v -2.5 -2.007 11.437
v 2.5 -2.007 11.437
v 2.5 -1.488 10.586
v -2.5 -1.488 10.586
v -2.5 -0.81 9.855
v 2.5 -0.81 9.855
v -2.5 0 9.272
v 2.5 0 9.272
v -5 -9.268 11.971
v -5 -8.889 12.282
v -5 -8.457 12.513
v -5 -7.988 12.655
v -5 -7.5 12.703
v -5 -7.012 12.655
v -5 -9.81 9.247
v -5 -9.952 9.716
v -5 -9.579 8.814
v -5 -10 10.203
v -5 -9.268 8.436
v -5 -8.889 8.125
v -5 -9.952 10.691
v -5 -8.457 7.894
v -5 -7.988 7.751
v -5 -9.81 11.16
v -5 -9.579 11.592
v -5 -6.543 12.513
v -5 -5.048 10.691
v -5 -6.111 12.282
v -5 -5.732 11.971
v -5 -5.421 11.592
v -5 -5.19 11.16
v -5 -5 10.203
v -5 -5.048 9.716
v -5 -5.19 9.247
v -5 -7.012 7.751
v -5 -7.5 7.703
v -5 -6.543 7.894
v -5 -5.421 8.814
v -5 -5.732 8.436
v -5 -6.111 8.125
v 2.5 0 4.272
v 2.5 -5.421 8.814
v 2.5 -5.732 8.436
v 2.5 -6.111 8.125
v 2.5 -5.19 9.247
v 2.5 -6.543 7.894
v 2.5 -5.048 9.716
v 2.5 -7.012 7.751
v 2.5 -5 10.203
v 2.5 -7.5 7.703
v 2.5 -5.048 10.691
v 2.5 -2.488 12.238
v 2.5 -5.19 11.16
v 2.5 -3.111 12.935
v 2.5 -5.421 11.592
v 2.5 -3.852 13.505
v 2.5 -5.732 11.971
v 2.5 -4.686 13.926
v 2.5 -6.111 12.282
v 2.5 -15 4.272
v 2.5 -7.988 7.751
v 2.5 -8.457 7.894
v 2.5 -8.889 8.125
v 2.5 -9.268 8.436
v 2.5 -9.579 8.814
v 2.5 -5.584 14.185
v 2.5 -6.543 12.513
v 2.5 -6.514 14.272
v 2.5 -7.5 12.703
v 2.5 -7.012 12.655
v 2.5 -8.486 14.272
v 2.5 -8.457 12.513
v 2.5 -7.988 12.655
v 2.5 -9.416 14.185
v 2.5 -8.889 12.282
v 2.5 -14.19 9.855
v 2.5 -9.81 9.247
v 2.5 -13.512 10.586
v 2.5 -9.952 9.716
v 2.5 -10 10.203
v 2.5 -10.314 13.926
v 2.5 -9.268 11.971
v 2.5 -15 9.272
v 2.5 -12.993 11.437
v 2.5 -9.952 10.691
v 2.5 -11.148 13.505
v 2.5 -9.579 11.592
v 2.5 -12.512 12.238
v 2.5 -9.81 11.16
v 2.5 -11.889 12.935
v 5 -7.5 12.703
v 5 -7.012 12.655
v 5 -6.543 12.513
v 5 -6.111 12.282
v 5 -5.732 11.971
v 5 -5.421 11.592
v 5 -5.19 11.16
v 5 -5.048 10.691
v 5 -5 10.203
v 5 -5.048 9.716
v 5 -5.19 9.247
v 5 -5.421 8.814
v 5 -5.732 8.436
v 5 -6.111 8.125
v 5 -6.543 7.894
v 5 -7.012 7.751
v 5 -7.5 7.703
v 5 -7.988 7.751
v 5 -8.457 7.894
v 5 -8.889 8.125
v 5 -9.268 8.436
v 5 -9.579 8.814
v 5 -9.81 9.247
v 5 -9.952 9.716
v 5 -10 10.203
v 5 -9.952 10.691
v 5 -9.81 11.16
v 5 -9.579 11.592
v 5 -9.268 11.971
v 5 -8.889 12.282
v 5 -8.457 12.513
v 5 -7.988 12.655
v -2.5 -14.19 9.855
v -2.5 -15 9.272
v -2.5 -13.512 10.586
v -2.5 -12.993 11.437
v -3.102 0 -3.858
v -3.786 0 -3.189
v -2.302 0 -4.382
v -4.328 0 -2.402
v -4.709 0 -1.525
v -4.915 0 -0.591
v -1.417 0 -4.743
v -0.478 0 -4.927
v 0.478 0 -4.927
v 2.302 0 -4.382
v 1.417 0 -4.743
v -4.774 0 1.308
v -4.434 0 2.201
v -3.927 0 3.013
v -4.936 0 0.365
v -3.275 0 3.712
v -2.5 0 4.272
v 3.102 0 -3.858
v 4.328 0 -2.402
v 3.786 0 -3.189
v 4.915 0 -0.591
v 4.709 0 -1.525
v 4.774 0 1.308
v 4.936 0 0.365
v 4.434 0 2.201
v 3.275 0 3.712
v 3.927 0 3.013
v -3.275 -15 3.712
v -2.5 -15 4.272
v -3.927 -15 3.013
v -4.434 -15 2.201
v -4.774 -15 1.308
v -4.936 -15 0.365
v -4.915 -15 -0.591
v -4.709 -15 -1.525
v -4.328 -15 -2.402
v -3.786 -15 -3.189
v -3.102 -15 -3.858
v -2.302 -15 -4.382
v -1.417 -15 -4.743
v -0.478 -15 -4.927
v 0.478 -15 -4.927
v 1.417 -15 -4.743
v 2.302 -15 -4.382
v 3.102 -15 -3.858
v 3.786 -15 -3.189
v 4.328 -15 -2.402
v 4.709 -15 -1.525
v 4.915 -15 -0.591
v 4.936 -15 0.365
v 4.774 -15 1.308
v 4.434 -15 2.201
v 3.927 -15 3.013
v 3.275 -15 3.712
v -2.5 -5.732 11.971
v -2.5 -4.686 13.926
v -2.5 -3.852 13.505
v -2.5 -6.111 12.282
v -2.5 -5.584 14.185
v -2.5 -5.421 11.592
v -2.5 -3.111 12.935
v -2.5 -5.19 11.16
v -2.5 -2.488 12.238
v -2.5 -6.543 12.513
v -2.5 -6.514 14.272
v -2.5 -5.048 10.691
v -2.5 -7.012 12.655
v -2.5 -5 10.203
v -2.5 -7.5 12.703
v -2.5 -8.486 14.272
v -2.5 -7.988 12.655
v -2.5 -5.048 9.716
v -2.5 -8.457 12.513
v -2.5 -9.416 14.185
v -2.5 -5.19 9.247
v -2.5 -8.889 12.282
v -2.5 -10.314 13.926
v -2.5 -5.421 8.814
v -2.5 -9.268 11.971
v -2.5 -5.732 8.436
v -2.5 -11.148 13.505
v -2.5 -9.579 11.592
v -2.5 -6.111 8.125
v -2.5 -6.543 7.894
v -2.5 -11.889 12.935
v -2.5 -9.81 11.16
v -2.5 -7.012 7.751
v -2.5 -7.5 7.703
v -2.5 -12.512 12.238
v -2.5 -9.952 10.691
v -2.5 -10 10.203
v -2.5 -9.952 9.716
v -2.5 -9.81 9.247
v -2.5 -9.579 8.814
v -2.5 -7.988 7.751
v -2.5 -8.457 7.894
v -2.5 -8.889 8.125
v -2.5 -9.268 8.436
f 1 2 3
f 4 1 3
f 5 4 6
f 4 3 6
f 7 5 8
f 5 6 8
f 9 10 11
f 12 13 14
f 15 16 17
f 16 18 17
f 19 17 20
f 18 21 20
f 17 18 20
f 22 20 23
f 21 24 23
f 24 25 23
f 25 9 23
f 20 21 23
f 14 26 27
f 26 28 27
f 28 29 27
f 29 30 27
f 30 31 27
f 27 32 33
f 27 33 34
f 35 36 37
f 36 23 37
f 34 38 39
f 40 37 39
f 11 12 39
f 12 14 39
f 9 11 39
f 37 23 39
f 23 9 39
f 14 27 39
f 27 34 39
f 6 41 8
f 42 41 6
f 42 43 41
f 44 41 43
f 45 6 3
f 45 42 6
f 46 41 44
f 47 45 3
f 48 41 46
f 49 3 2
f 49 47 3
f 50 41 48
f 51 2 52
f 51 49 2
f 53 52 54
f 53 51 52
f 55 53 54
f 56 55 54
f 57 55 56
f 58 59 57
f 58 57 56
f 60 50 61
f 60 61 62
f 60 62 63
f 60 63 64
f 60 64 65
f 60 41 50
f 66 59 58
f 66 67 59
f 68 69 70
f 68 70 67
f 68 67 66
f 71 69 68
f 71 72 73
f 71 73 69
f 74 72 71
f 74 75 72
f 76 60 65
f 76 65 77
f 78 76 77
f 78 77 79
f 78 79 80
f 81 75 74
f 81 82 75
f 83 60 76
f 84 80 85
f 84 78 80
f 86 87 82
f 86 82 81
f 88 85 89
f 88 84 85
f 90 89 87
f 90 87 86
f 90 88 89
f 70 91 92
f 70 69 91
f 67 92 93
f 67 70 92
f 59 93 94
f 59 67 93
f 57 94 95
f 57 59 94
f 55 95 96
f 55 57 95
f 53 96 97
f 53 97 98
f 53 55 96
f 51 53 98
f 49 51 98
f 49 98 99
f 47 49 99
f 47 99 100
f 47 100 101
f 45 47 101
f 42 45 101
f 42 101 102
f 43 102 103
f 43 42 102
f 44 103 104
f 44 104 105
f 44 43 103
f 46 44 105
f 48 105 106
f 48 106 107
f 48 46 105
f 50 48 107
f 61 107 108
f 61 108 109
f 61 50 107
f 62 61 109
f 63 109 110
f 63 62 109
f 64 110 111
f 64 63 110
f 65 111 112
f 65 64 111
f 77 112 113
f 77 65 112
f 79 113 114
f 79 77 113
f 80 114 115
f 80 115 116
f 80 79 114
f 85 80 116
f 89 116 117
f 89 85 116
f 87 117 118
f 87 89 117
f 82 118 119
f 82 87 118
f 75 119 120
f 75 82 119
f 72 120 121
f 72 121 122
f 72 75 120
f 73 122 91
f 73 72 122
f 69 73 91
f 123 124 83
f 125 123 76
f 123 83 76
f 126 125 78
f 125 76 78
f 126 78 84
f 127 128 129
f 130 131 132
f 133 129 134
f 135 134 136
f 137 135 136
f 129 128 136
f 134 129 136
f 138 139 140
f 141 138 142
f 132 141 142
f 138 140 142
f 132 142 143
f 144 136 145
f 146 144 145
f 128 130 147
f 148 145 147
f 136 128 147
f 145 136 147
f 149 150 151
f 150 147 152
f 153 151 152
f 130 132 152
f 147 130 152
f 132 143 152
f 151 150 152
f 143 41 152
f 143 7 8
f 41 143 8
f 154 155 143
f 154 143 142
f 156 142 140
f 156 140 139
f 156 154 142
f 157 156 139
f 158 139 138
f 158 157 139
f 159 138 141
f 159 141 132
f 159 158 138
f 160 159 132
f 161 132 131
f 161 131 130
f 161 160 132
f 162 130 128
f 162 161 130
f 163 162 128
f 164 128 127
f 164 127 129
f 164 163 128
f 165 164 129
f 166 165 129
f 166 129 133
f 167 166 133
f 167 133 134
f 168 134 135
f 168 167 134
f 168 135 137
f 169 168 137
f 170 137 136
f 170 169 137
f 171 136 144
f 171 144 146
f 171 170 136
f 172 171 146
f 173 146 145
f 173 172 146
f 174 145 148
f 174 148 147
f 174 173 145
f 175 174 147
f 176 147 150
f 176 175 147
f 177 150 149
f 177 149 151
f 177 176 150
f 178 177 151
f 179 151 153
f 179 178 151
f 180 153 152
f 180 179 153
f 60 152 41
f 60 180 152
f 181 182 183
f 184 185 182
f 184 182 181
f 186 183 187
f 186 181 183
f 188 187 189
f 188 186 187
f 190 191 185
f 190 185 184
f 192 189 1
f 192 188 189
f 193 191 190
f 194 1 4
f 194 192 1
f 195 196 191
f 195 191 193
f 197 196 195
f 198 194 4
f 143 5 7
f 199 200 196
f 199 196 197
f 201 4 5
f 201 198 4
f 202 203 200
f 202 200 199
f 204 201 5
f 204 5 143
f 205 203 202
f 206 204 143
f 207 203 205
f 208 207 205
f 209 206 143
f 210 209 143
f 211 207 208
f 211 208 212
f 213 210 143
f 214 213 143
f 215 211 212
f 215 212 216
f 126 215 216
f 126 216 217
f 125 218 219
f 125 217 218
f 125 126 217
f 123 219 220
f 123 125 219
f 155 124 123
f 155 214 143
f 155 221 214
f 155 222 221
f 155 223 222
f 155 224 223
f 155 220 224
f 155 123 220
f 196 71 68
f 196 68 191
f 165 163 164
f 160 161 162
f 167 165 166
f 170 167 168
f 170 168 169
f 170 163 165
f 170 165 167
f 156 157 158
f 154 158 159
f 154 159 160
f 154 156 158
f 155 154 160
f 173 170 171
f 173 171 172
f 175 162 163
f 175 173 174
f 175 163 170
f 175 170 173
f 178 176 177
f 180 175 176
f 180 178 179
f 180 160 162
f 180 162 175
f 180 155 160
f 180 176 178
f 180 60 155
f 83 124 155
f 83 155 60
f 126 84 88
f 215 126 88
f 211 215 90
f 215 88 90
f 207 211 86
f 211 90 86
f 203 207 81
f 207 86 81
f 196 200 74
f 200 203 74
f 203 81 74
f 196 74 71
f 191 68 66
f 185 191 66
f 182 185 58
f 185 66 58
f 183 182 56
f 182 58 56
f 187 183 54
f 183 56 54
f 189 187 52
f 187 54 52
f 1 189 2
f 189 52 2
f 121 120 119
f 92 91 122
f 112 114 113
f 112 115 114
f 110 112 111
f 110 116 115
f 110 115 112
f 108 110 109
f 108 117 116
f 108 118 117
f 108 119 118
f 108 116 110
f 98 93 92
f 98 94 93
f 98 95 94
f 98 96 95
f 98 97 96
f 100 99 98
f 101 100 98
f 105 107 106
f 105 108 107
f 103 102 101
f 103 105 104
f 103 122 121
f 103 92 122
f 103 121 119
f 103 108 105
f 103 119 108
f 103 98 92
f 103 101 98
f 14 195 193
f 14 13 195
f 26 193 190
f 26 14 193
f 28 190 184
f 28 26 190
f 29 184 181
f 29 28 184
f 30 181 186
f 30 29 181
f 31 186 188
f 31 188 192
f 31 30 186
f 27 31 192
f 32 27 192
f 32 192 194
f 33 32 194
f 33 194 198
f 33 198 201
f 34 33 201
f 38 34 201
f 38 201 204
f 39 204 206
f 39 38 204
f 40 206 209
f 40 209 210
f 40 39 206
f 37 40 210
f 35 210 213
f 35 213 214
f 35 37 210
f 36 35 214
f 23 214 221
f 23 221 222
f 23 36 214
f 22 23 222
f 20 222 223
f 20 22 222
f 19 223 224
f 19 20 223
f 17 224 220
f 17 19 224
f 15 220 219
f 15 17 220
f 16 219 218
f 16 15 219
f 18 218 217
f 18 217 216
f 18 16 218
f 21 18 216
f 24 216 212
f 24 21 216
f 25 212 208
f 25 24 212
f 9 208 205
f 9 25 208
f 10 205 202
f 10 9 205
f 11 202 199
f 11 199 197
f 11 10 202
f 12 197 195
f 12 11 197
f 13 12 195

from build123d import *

# Parameters (mm, degrees)
BOSS_EXTRUDE1_DEPTH = 15
CUT_EXTRUDE1_DEPTH  = 23.004565192
CUT_EXTRUDE2_DEPTH  = 23.004565192
SKETCH4_W           = 2.5
SKETCH4_H           = 2.5
SKETCH5_W           = 2.5
SKETCH5_H           = 2.5


with BuildPart() as part:
    # Sketch1 → Boss-Extrude1 (new body)
    with BuildSketch(Plane.XZ.offset(15)):
        with BuildLine():
            Line((-2.5, 14.272294466), (-2.5, 4.272294466))
            ThreePointArc((-2.5, 4.272294466), (0, -4.95), (2.5, 4.272294466))
            Line((2.5, 4.272294466), (2.5, 14.272294466))
            Line((2.5, 14.272294466), (-2.5, 14.272294466))
        make_face()
    extrude(amount=-BOSS_EXTRUDE1_DEPTH)

    # Sketch2 → Cut-Extrude1 (cut, through all)
    with BuildSketch(Plane(origin=(2.5, 0, 0), x_dir=(0, 0, -1), z_dir=(1, 0, 0))):
        with BuildLine():
            Line((-14.272294466, -15), (-9.272294466, -15))
            ThreePointArc((-9.272294466, -15), (-10.203329527, -13.83309751), (-11.437357975, -12.993060906))
            ThreePointArc((-11.437357975, -12.993060906), (-13.504629374, -11.148327894), (-14.272294466, -8.486121811))
            Line((-14.272294466, -8.486121811), (-14.272294466, -15))
        make_face()
    extrude(amount=-CUT_EXTRUDE1_DEPTH, mode=Mode.SUBTRACT)

    # Sketch3 → Cut-Extrude2 (cut, through all)
    with BuildSketch(Plane(origin=(2.5, 0, 0), x_dir=(0, 0, -1), z_dir=(1, 0, 0))):
        with BuildLine():
            Line((-9.272294466, 0), (-14.272294466, 0))
            Line((-14.272294466, 0), (-14.272294466, -6.513878189))
            ThreePointArc((-14.272294466, -6.513878189), (-13.504629374, -3.851672106), (-11.437357975, -2.006939094))
            ThreePointArc((-11.437357975, -2.006939094), (-10.203329527, -1.16690249), (-9.272294466, 0))
        make_face()
    extrude(amount=-CUT_EXTRUDE2_DEPTH, mode=Mode.SUBTRACT)

    # Sketch4 → Revolve1 (revolve)
    with BuildSketch(Plane(origin=(0, 0, 10.203329527), x_dir=(-1, 0, 0), z_dir=(0, 0, -1)), mode=Mode.PRIVATE) as revolve1_sk:
        with Locations((3.75, -6.25)):
            Rectangle(SKETCH4_W, SKETCH4_H)
    revolve(revolve1_sk.sketch.rotate(Axis((-2.5, -7.5, 10.203329527), (-1, 0, 0)), 270), axis=Axis((-2.5, -7.5, 10.203329527), (-1, 0, 0)))

    # Sketch5 → Revolve2 (revolve)
    with BuildSketch(Plane(origin=(0, 0, 10.203329527), x_dir=(-1, 0, 0), z_dir=(0, 0, -1)), mode=Mode.PRIVATE) as revolve2_sk:
        with Locations((-3.75, -6.25)):
            Rectangle(SKETCH5_W, SKETCH5_H)
    revolve(revolve2_sk.sketch.rotate(Axis((5, -7.5, 10.203329527), (-1, 0, 0)), 270), axis=Axis((5, -7.5, 10.203329527), (-1, 0, 0)))


solid = part.part
